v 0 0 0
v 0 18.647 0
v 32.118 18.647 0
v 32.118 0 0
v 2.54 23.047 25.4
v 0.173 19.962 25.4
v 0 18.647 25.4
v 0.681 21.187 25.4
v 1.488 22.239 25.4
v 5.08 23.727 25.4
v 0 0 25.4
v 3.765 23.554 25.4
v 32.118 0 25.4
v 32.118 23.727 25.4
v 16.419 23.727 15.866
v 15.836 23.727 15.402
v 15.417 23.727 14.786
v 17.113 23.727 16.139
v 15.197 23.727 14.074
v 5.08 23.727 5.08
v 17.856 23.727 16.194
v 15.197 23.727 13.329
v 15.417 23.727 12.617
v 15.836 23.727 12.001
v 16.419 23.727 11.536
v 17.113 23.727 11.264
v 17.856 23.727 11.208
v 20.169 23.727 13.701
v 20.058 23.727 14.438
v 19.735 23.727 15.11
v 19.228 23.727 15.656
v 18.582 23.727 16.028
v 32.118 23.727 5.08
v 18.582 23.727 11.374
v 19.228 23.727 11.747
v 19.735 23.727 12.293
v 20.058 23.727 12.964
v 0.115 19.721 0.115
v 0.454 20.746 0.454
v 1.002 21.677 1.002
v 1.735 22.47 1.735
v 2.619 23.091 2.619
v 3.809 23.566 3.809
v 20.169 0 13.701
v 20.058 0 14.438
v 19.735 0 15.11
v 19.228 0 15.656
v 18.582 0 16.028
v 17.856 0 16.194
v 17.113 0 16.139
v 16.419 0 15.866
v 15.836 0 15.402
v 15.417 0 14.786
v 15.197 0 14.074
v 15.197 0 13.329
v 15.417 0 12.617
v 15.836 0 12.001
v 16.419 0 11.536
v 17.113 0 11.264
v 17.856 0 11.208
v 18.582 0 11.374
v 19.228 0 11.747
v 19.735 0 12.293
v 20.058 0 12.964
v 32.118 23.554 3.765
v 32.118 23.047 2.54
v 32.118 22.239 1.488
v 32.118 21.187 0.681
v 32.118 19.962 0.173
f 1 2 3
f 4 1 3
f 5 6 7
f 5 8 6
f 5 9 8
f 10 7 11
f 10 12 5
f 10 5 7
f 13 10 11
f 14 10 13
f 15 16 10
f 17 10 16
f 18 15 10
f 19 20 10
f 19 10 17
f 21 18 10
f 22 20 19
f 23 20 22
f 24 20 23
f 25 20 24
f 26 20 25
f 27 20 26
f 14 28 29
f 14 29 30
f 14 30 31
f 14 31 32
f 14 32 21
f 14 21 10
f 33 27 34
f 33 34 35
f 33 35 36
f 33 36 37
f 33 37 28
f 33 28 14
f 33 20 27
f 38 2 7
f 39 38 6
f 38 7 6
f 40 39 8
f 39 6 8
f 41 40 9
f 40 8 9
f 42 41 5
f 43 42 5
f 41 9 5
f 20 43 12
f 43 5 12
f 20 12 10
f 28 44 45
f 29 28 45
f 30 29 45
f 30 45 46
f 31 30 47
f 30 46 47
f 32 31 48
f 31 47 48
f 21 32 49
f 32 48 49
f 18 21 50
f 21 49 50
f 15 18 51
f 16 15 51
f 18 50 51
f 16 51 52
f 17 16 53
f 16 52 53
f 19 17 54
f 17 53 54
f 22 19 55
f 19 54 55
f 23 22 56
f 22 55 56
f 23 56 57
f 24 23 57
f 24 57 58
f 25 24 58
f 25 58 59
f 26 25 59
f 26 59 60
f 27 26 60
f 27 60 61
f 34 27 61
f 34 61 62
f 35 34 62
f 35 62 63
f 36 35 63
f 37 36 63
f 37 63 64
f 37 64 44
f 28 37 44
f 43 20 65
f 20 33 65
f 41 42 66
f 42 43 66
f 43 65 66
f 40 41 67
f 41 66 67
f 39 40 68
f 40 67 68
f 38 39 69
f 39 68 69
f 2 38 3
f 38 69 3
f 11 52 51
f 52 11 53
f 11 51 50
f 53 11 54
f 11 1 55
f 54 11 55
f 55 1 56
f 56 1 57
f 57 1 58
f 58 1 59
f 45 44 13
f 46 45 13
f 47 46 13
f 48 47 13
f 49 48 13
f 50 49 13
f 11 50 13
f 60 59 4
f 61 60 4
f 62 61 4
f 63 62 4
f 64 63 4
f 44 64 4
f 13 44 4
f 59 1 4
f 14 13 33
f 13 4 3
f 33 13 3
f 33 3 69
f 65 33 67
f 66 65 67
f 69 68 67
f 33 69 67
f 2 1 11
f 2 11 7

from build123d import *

# Parameters (mm, degrees)
F0_W     = 32.118473202
F0_H     = 23.727130854
F1_DEPTH = 25.4
F2_R     = 5.08
F4_D     = 5


with BuildPart() as f1:
    # F0 (on Top) → F1 (new body)
    with BuildSketch(Plane.XY):
        with Locations((16.059236601, 11.863565427)):
            Rectangle(F0_W, F0_H)
    extrude(amount=F1_DEPTH)

    # F2
    f2_edges = [f1.edges().sort_by_distance(p)[0] for p in [
        (0, 23.727131, 12.7),
        (16.059237, 23.727131, 0),
    ]]
    fillet(f2_edges, radius=F2_R)

    # F4 (through all)
    with Locations(Plane(origin=(0, 23.727130854, 0), x_dir=(-1, 0, 0), z_dir=(0, 1, 0))):
        with Locations((-17.6689904183, 13.7012554333)):
            Hole(F4_D / 2)


solid = f1.part
